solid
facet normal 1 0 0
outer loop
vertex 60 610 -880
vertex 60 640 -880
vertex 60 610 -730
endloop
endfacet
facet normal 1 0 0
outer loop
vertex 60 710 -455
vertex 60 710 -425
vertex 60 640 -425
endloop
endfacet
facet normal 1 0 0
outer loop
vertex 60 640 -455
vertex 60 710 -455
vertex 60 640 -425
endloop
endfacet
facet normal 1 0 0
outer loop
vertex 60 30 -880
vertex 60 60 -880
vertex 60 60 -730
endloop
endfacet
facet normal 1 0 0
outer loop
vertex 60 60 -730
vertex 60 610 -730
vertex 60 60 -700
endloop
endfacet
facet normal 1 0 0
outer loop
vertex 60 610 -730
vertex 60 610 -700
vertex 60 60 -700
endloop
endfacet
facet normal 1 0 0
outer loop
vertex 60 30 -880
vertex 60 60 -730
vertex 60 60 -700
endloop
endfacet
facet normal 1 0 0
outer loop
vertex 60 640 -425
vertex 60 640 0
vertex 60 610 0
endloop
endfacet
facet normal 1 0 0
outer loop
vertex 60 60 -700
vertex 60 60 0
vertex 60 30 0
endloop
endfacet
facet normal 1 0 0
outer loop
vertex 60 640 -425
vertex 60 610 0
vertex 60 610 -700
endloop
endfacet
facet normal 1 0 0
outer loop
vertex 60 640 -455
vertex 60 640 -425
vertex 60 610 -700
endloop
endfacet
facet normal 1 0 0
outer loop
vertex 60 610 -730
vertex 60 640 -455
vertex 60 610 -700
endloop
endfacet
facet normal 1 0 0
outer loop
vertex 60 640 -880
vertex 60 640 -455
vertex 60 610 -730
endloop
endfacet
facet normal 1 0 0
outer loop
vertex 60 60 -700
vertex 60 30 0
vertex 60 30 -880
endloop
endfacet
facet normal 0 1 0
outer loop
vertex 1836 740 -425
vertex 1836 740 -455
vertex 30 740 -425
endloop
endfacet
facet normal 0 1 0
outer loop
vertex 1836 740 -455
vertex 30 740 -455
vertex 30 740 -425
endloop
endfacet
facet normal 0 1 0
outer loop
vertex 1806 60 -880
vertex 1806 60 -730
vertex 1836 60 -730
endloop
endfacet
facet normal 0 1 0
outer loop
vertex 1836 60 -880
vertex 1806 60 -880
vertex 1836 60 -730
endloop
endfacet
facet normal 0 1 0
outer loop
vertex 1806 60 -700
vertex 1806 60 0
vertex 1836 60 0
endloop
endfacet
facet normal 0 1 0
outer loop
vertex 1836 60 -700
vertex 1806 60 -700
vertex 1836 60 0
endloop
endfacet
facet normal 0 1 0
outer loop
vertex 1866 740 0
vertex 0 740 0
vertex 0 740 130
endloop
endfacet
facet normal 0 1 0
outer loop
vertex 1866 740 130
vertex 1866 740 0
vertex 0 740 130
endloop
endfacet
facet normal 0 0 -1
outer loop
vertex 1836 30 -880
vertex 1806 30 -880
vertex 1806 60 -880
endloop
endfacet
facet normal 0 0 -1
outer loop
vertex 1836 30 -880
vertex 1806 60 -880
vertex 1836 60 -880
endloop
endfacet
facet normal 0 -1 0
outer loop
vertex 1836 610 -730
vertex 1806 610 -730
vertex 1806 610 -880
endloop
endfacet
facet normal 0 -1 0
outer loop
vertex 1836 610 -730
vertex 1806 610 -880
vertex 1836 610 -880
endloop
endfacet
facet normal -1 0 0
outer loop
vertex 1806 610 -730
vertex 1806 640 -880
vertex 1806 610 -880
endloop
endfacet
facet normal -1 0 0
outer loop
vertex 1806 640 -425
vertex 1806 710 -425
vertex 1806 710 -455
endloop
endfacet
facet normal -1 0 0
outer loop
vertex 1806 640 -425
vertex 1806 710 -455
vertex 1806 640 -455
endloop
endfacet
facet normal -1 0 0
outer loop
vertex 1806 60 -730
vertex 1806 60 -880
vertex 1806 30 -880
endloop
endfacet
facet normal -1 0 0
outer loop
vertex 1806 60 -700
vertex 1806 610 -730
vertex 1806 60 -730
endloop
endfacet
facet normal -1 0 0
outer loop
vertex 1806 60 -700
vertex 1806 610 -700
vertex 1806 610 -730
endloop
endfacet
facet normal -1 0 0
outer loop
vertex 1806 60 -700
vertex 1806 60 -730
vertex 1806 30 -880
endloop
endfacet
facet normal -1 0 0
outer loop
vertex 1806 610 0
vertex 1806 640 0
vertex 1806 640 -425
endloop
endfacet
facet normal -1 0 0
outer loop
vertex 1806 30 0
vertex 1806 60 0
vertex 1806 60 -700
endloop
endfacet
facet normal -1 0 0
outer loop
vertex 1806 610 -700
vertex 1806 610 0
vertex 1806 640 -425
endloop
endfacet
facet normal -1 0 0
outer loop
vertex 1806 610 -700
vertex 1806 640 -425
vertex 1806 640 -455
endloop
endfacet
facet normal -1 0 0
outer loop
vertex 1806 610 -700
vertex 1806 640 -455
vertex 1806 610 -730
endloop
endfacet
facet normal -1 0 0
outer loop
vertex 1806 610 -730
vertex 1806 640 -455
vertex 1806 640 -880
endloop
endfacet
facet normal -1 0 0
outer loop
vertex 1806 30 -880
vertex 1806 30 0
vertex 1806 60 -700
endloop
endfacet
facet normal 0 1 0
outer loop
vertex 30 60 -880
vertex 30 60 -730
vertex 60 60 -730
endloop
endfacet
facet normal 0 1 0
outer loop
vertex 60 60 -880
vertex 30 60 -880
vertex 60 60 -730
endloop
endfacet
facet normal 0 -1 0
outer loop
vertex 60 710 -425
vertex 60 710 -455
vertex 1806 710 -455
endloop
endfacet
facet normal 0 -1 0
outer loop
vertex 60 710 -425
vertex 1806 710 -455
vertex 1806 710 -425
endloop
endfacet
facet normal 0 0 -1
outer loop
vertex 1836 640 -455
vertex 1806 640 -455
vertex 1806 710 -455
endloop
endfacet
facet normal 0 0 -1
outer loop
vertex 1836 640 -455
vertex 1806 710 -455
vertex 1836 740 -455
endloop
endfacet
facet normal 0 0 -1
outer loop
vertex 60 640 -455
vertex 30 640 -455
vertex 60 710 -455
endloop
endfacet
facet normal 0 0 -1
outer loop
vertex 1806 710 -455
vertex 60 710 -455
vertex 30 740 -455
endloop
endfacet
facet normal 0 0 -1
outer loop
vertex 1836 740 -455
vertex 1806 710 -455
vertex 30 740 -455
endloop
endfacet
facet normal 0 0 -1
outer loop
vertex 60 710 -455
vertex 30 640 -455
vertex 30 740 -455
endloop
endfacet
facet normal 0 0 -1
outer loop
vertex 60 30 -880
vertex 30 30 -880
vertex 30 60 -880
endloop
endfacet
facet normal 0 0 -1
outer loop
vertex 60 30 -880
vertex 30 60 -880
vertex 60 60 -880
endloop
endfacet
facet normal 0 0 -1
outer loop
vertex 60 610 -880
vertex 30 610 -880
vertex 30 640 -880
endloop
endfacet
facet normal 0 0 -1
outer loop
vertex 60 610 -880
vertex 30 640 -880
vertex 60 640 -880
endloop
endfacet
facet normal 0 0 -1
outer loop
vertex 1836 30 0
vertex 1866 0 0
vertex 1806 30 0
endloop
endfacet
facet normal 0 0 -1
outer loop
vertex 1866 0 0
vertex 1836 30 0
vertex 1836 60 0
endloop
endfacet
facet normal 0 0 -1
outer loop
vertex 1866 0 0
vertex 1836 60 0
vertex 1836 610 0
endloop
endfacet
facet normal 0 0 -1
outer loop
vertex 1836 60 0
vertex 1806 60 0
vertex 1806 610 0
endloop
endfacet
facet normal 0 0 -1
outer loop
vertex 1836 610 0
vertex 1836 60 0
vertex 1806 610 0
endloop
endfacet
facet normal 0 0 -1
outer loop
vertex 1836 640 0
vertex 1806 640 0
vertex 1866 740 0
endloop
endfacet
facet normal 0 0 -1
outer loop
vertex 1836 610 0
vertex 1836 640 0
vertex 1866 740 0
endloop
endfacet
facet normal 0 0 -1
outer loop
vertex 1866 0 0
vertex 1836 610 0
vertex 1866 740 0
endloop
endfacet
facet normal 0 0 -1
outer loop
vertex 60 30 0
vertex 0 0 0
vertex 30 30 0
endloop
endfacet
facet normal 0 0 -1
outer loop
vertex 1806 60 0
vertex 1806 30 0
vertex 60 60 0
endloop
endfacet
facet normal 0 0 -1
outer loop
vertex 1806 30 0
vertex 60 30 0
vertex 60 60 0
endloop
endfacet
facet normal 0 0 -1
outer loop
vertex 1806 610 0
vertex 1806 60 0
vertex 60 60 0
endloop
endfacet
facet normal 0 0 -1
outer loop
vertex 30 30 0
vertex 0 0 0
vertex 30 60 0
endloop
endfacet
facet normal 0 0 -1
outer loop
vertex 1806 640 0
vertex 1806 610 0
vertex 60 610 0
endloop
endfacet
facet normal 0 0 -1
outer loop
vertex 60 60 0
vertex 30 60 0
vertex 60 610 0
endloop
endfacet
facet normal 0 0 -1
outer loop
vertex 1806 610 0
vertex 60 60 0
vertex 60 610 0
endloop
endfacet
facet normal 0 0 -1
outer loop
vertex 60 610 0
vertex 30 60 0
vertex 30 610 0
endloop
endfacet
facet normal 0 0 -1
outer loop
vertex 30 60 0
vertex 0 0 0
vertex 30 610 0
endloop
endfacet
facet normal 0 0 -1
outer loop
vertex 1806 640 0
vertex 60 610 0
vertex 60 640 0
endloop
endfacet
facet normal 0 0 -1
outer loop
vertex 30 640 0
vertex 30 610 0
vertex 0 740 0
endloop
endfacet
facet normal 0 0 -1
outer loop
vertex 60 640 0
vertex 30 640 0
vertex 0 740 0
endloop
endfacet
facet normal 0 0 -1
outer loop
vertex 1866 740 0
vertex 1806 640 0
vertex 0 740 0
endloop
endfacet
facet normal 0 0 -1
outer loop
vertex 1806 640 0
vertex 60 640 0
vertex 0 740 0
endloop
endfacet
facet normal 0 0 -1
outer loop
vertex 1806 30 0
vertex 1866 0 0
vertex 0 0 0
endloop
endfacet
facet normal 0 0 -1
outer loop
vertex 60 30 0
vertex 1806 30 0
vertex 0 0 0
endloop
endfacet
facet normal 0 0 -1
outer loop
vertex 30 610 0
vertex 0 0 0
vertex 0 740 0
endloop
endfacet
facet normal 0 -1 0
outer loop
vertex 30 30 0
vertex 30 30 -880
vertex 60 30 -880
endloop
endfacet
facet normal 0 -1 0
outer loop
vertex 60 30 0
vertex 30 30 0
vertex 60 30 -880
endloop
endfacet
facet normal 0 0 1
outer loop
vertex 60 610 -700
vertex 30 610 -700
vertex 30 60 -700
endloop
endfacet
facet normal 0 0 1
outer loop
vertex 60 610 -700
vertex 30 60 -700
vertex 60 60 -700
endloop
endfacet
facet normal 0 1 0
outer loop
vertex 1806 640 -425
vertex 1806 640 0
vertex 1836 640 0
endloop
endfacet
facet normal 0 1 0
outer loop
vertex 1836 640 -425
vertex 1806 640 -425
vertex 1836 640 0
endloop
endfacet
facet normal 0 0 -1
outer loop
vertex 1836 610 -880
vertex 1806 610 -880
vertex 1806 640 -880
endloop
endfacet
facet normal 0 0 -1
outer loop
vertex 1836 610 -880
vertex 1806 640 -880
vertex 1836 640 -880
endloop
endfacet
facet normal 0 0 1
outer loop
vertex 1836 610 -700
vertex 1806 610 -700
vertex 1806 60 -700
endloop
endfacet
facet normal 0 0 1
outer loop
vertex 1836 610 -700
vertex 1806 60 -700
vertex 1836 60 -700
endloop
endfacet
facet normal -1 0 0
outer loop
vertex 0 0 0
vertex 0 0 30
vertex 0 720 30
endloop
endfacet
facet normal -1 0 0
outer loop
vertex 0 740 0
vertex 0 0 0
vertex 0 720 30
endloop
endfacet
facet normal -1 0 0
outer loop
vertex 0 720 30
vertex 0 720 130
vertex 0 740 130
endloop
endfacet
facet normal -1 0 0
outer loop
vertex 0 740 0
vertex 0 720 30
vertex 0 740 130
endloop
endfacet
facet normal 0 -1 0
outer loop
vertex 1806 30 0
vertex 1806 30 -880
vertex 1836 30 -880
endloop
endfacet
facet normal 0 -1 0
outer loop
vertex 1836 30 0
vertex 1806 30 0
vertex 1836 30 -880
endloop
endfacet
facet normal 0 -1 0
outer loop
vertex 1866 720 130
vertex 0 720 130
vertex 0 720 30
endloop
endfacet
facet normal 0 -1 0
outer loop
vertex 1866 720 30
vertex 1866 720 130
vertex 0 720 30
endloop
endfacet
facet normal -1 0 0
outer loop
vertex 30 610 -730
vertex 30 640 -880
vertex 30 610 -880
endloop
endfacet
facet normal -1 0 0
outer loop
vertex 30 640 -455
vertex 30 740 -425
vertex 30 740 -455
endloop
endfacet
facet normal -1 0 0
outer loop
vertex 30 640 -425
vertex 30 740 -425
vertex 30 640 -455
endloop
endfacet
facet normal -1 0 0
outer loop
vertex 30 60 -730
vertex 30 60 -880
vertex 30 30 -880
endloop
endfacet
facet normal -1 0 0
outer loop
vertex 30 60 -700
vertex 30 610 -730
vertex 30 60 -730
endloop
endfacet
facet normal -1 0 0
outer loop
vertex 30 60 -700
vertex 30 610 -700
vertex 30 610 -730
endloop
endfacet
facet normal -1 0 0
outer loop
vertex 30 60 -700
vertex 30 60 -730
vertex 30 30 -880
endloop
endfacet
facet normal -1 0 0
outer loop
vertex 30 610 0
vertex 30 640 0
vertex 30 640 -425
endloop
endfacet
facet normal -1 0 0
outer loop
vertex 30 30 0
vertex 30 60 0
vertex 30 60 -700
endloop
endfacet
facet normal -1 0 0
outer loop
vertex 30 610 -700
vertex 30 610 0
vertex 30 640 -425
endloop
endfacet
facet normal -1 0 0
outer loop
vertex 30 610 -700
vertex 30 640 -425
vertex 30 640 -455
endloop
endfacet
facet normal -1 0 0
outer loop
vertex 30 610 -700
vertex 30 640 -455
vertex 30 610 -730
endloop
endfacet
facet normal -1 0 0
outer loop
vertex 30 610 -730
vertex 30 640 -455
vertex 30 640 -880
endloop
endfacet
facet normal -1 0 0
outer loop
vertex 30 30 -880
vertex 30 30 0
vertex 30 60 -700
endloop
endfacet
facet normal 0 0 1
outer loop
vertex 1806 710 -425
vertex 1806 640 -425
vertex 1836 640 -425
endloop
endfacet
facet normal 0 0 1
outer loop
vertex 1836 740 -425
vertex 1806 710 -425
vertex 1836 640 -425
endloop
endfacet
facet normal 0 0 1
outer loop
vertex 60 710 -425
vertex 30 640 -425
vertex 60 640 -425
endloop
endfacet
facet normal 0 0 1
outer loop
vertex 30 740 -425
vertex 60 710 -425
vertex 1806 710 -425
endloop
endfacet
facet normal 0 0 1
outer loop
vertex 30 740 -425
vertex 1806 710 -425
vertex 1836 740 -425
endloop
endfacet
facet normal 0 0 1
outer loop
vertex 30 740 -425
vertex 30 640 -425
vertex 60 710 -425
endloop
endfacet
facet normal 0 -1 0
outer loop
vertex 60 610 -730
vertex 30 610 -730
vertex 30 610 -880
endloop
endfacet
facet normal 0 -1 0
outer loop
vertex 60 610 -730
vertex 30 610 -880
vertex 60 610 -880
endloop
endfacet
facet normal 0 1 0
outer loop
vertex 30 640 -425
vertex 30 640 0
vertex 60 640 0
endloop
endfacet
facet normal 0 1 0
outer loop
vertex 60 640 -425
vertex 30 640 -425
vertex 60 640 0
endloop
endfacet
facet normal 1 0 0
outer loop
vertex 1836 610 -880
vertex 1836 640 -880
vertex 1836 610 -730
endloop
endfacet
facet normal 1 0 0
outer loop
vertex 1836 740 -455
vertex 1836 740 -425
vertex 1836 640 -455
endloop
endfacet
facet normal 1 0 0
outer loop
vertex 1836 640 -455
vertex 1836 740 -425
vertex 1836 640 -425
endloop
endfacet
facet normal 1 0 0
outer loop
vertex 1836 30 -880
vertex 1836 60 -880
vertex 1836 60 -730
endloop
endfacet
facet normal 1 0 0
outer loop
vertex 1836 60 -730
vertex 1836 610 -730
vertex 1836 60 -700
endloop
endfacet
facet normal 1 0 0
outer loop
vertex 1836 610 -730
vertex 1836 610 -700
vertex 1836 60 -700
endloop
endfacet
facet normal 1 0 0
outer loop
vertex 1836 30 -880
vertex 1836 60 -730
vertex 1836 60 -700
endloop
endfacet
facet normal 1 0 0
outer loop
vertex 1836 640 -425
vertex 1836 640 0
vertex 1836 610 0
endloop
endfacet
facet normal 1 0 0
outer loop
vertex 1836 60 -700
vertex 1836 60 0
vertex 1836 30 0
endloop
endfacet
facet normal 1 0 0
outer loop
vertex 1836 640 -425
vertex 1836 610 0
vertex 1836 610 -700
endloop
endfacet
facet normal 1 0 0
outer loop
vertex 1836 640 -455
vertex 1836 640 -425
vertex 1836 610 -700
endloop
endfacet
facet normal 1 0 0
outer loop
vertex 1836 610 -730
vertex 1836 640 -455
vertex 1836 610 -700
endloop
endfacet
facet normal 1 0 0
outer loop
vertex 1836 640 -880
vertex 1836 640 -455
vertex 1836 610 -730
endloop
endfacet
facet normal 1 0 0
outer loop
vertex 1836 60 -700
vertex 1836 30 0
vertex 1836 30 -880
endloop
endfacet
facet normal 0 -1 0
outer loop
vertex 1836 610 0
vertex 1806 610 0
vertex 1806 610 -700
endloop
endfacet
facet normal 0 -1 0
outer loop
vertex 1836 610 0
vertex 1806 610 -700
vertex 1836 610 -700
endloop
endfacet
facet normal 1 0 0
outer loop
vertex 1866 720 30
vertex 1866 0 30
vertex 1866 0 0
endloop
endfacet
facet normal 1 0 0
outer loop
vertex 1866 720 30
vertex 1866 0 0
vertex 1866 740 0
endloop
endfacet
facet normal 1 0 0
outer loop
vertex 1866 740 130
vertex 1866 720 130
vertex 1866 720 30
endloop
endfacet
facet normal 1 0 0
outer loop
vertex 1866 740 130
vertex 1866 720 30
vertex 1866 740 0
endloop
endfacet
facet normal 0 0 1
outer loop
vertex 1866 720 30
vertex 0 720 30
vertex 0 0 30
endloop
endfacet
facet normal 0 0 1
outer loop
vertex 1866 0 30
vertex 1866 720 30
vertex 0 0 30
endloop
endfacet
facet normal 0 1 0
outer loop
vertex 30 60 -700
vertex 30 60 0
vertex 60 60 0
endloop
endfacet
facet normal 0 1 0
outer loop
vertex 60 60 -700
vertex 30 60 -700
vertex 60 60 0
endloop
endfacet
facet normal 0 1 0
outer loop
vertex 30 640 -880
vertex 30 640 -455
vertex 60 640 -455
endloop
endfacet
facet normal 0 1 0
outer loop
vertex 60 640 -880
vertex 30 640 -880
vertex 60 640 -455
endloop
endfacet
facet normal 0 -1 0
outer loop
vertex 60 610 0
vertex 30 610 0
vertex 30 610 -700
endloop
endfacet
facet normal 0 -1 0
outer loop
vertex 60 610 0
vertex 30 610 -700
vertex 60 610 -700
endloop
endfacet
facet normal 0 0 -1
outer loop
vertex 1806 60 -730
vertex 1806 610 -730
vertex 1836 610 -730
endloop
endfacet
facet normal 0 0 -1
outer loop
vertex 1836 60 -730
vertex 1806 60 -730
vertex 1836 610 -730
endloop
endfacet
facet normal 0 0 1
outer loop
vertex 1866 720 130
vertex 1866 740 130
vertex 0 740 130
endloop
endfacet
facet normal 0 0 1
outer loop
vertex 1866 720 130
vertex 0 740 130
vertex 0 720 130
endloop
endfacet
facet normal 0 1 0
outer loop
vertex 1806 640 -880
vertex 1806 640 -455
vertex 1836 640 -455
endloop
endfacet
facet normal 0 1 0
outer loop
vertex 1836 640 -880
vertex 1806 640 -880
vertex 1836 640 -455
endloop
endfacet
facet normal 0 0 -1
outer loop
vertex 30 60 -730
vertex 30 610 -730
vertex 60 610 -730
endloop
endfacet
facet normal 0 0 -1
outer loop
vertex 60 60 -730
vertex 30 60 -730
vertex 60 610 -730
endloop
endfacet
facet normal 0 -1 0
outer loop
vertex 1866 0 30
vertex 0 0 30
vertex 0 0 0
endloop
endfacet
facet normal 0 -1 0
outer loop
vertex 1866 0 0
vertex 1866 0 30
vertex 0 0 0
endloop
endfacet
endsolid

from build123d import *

# Parameters (mm, degrees)
F1_DEPTH = 1866
F2_W     = 30
F2_H     = 30
F3_DEPTH = 880
F4_W     = 30
F4_H     = 30
F5_DEPTH = 550
F6_W     = 30
F6_H     = 30
F7_DEPTH = 100
F8_W     = 30
F8_H     = 30
F9_DEPTH = 1746


with BuildPart() as f1:
    # F0 (on Right) → F1 (new body)
    with BuildSketch(Plane.YZ):
        Polygon((0, 30), (0, 0), (740, 0), (740, 130), (720, 130), (720, 30), align=None)
    extrude(amount=F1_DEPTH)

    # F2 (on face) → F3 (join)
    with BuildSketch(Plane(origin=(0, 0, 0), x_dir=(1, 0, 0), z_dir=(0, 0, -1))):
        with Locations((45, -45)):
            Rectangle(F2_W, F2_H)
        with Locations((1821, -45)):
            Rectangle(F2_W, F2_H)
        with Locations((1821, -625)):
            Rectangle(F2_W, F2_H)
        with Locations((45, -625)):
            Rectangle(F2_W, F2_H)
    extrude(amount=F3_DEPTH)

    # F4 (on face) → F5 (join, through all)
    with BuildSketch(Plane.XZ.offset(-610)):
        with Locations((45, -715)):
            Rectangle(F4_W, F4_H)
        with Locations((1821, -715)):
            Rectangle(F4_W, F4_H)
    extrude(amount=F5_DEPTH)

    # F6 (on face) → F7 (join)
    with BuildSketch(Plane(origin=(0, 640, 0), x_dir=(-1, 0, 0), z_dir=(0, 1, 0))):
        with Locations((-45, -440)):
            Rectangle(F6_W, F6_H)
        with Locations((-1821, -440)):
            Rectangle(F6_W, F6_H)
    extrude(amount=F7_DEPTH)

    # F8 (on face) → F9 (join, through all)
    with BuildSketch(Plane.YZ.offset(60)):
        with Locations((725, -440)):
            Rectangle(F8_W, F8_H)
    extrude(amount=F9_DEPTH)


solid = f1.part
